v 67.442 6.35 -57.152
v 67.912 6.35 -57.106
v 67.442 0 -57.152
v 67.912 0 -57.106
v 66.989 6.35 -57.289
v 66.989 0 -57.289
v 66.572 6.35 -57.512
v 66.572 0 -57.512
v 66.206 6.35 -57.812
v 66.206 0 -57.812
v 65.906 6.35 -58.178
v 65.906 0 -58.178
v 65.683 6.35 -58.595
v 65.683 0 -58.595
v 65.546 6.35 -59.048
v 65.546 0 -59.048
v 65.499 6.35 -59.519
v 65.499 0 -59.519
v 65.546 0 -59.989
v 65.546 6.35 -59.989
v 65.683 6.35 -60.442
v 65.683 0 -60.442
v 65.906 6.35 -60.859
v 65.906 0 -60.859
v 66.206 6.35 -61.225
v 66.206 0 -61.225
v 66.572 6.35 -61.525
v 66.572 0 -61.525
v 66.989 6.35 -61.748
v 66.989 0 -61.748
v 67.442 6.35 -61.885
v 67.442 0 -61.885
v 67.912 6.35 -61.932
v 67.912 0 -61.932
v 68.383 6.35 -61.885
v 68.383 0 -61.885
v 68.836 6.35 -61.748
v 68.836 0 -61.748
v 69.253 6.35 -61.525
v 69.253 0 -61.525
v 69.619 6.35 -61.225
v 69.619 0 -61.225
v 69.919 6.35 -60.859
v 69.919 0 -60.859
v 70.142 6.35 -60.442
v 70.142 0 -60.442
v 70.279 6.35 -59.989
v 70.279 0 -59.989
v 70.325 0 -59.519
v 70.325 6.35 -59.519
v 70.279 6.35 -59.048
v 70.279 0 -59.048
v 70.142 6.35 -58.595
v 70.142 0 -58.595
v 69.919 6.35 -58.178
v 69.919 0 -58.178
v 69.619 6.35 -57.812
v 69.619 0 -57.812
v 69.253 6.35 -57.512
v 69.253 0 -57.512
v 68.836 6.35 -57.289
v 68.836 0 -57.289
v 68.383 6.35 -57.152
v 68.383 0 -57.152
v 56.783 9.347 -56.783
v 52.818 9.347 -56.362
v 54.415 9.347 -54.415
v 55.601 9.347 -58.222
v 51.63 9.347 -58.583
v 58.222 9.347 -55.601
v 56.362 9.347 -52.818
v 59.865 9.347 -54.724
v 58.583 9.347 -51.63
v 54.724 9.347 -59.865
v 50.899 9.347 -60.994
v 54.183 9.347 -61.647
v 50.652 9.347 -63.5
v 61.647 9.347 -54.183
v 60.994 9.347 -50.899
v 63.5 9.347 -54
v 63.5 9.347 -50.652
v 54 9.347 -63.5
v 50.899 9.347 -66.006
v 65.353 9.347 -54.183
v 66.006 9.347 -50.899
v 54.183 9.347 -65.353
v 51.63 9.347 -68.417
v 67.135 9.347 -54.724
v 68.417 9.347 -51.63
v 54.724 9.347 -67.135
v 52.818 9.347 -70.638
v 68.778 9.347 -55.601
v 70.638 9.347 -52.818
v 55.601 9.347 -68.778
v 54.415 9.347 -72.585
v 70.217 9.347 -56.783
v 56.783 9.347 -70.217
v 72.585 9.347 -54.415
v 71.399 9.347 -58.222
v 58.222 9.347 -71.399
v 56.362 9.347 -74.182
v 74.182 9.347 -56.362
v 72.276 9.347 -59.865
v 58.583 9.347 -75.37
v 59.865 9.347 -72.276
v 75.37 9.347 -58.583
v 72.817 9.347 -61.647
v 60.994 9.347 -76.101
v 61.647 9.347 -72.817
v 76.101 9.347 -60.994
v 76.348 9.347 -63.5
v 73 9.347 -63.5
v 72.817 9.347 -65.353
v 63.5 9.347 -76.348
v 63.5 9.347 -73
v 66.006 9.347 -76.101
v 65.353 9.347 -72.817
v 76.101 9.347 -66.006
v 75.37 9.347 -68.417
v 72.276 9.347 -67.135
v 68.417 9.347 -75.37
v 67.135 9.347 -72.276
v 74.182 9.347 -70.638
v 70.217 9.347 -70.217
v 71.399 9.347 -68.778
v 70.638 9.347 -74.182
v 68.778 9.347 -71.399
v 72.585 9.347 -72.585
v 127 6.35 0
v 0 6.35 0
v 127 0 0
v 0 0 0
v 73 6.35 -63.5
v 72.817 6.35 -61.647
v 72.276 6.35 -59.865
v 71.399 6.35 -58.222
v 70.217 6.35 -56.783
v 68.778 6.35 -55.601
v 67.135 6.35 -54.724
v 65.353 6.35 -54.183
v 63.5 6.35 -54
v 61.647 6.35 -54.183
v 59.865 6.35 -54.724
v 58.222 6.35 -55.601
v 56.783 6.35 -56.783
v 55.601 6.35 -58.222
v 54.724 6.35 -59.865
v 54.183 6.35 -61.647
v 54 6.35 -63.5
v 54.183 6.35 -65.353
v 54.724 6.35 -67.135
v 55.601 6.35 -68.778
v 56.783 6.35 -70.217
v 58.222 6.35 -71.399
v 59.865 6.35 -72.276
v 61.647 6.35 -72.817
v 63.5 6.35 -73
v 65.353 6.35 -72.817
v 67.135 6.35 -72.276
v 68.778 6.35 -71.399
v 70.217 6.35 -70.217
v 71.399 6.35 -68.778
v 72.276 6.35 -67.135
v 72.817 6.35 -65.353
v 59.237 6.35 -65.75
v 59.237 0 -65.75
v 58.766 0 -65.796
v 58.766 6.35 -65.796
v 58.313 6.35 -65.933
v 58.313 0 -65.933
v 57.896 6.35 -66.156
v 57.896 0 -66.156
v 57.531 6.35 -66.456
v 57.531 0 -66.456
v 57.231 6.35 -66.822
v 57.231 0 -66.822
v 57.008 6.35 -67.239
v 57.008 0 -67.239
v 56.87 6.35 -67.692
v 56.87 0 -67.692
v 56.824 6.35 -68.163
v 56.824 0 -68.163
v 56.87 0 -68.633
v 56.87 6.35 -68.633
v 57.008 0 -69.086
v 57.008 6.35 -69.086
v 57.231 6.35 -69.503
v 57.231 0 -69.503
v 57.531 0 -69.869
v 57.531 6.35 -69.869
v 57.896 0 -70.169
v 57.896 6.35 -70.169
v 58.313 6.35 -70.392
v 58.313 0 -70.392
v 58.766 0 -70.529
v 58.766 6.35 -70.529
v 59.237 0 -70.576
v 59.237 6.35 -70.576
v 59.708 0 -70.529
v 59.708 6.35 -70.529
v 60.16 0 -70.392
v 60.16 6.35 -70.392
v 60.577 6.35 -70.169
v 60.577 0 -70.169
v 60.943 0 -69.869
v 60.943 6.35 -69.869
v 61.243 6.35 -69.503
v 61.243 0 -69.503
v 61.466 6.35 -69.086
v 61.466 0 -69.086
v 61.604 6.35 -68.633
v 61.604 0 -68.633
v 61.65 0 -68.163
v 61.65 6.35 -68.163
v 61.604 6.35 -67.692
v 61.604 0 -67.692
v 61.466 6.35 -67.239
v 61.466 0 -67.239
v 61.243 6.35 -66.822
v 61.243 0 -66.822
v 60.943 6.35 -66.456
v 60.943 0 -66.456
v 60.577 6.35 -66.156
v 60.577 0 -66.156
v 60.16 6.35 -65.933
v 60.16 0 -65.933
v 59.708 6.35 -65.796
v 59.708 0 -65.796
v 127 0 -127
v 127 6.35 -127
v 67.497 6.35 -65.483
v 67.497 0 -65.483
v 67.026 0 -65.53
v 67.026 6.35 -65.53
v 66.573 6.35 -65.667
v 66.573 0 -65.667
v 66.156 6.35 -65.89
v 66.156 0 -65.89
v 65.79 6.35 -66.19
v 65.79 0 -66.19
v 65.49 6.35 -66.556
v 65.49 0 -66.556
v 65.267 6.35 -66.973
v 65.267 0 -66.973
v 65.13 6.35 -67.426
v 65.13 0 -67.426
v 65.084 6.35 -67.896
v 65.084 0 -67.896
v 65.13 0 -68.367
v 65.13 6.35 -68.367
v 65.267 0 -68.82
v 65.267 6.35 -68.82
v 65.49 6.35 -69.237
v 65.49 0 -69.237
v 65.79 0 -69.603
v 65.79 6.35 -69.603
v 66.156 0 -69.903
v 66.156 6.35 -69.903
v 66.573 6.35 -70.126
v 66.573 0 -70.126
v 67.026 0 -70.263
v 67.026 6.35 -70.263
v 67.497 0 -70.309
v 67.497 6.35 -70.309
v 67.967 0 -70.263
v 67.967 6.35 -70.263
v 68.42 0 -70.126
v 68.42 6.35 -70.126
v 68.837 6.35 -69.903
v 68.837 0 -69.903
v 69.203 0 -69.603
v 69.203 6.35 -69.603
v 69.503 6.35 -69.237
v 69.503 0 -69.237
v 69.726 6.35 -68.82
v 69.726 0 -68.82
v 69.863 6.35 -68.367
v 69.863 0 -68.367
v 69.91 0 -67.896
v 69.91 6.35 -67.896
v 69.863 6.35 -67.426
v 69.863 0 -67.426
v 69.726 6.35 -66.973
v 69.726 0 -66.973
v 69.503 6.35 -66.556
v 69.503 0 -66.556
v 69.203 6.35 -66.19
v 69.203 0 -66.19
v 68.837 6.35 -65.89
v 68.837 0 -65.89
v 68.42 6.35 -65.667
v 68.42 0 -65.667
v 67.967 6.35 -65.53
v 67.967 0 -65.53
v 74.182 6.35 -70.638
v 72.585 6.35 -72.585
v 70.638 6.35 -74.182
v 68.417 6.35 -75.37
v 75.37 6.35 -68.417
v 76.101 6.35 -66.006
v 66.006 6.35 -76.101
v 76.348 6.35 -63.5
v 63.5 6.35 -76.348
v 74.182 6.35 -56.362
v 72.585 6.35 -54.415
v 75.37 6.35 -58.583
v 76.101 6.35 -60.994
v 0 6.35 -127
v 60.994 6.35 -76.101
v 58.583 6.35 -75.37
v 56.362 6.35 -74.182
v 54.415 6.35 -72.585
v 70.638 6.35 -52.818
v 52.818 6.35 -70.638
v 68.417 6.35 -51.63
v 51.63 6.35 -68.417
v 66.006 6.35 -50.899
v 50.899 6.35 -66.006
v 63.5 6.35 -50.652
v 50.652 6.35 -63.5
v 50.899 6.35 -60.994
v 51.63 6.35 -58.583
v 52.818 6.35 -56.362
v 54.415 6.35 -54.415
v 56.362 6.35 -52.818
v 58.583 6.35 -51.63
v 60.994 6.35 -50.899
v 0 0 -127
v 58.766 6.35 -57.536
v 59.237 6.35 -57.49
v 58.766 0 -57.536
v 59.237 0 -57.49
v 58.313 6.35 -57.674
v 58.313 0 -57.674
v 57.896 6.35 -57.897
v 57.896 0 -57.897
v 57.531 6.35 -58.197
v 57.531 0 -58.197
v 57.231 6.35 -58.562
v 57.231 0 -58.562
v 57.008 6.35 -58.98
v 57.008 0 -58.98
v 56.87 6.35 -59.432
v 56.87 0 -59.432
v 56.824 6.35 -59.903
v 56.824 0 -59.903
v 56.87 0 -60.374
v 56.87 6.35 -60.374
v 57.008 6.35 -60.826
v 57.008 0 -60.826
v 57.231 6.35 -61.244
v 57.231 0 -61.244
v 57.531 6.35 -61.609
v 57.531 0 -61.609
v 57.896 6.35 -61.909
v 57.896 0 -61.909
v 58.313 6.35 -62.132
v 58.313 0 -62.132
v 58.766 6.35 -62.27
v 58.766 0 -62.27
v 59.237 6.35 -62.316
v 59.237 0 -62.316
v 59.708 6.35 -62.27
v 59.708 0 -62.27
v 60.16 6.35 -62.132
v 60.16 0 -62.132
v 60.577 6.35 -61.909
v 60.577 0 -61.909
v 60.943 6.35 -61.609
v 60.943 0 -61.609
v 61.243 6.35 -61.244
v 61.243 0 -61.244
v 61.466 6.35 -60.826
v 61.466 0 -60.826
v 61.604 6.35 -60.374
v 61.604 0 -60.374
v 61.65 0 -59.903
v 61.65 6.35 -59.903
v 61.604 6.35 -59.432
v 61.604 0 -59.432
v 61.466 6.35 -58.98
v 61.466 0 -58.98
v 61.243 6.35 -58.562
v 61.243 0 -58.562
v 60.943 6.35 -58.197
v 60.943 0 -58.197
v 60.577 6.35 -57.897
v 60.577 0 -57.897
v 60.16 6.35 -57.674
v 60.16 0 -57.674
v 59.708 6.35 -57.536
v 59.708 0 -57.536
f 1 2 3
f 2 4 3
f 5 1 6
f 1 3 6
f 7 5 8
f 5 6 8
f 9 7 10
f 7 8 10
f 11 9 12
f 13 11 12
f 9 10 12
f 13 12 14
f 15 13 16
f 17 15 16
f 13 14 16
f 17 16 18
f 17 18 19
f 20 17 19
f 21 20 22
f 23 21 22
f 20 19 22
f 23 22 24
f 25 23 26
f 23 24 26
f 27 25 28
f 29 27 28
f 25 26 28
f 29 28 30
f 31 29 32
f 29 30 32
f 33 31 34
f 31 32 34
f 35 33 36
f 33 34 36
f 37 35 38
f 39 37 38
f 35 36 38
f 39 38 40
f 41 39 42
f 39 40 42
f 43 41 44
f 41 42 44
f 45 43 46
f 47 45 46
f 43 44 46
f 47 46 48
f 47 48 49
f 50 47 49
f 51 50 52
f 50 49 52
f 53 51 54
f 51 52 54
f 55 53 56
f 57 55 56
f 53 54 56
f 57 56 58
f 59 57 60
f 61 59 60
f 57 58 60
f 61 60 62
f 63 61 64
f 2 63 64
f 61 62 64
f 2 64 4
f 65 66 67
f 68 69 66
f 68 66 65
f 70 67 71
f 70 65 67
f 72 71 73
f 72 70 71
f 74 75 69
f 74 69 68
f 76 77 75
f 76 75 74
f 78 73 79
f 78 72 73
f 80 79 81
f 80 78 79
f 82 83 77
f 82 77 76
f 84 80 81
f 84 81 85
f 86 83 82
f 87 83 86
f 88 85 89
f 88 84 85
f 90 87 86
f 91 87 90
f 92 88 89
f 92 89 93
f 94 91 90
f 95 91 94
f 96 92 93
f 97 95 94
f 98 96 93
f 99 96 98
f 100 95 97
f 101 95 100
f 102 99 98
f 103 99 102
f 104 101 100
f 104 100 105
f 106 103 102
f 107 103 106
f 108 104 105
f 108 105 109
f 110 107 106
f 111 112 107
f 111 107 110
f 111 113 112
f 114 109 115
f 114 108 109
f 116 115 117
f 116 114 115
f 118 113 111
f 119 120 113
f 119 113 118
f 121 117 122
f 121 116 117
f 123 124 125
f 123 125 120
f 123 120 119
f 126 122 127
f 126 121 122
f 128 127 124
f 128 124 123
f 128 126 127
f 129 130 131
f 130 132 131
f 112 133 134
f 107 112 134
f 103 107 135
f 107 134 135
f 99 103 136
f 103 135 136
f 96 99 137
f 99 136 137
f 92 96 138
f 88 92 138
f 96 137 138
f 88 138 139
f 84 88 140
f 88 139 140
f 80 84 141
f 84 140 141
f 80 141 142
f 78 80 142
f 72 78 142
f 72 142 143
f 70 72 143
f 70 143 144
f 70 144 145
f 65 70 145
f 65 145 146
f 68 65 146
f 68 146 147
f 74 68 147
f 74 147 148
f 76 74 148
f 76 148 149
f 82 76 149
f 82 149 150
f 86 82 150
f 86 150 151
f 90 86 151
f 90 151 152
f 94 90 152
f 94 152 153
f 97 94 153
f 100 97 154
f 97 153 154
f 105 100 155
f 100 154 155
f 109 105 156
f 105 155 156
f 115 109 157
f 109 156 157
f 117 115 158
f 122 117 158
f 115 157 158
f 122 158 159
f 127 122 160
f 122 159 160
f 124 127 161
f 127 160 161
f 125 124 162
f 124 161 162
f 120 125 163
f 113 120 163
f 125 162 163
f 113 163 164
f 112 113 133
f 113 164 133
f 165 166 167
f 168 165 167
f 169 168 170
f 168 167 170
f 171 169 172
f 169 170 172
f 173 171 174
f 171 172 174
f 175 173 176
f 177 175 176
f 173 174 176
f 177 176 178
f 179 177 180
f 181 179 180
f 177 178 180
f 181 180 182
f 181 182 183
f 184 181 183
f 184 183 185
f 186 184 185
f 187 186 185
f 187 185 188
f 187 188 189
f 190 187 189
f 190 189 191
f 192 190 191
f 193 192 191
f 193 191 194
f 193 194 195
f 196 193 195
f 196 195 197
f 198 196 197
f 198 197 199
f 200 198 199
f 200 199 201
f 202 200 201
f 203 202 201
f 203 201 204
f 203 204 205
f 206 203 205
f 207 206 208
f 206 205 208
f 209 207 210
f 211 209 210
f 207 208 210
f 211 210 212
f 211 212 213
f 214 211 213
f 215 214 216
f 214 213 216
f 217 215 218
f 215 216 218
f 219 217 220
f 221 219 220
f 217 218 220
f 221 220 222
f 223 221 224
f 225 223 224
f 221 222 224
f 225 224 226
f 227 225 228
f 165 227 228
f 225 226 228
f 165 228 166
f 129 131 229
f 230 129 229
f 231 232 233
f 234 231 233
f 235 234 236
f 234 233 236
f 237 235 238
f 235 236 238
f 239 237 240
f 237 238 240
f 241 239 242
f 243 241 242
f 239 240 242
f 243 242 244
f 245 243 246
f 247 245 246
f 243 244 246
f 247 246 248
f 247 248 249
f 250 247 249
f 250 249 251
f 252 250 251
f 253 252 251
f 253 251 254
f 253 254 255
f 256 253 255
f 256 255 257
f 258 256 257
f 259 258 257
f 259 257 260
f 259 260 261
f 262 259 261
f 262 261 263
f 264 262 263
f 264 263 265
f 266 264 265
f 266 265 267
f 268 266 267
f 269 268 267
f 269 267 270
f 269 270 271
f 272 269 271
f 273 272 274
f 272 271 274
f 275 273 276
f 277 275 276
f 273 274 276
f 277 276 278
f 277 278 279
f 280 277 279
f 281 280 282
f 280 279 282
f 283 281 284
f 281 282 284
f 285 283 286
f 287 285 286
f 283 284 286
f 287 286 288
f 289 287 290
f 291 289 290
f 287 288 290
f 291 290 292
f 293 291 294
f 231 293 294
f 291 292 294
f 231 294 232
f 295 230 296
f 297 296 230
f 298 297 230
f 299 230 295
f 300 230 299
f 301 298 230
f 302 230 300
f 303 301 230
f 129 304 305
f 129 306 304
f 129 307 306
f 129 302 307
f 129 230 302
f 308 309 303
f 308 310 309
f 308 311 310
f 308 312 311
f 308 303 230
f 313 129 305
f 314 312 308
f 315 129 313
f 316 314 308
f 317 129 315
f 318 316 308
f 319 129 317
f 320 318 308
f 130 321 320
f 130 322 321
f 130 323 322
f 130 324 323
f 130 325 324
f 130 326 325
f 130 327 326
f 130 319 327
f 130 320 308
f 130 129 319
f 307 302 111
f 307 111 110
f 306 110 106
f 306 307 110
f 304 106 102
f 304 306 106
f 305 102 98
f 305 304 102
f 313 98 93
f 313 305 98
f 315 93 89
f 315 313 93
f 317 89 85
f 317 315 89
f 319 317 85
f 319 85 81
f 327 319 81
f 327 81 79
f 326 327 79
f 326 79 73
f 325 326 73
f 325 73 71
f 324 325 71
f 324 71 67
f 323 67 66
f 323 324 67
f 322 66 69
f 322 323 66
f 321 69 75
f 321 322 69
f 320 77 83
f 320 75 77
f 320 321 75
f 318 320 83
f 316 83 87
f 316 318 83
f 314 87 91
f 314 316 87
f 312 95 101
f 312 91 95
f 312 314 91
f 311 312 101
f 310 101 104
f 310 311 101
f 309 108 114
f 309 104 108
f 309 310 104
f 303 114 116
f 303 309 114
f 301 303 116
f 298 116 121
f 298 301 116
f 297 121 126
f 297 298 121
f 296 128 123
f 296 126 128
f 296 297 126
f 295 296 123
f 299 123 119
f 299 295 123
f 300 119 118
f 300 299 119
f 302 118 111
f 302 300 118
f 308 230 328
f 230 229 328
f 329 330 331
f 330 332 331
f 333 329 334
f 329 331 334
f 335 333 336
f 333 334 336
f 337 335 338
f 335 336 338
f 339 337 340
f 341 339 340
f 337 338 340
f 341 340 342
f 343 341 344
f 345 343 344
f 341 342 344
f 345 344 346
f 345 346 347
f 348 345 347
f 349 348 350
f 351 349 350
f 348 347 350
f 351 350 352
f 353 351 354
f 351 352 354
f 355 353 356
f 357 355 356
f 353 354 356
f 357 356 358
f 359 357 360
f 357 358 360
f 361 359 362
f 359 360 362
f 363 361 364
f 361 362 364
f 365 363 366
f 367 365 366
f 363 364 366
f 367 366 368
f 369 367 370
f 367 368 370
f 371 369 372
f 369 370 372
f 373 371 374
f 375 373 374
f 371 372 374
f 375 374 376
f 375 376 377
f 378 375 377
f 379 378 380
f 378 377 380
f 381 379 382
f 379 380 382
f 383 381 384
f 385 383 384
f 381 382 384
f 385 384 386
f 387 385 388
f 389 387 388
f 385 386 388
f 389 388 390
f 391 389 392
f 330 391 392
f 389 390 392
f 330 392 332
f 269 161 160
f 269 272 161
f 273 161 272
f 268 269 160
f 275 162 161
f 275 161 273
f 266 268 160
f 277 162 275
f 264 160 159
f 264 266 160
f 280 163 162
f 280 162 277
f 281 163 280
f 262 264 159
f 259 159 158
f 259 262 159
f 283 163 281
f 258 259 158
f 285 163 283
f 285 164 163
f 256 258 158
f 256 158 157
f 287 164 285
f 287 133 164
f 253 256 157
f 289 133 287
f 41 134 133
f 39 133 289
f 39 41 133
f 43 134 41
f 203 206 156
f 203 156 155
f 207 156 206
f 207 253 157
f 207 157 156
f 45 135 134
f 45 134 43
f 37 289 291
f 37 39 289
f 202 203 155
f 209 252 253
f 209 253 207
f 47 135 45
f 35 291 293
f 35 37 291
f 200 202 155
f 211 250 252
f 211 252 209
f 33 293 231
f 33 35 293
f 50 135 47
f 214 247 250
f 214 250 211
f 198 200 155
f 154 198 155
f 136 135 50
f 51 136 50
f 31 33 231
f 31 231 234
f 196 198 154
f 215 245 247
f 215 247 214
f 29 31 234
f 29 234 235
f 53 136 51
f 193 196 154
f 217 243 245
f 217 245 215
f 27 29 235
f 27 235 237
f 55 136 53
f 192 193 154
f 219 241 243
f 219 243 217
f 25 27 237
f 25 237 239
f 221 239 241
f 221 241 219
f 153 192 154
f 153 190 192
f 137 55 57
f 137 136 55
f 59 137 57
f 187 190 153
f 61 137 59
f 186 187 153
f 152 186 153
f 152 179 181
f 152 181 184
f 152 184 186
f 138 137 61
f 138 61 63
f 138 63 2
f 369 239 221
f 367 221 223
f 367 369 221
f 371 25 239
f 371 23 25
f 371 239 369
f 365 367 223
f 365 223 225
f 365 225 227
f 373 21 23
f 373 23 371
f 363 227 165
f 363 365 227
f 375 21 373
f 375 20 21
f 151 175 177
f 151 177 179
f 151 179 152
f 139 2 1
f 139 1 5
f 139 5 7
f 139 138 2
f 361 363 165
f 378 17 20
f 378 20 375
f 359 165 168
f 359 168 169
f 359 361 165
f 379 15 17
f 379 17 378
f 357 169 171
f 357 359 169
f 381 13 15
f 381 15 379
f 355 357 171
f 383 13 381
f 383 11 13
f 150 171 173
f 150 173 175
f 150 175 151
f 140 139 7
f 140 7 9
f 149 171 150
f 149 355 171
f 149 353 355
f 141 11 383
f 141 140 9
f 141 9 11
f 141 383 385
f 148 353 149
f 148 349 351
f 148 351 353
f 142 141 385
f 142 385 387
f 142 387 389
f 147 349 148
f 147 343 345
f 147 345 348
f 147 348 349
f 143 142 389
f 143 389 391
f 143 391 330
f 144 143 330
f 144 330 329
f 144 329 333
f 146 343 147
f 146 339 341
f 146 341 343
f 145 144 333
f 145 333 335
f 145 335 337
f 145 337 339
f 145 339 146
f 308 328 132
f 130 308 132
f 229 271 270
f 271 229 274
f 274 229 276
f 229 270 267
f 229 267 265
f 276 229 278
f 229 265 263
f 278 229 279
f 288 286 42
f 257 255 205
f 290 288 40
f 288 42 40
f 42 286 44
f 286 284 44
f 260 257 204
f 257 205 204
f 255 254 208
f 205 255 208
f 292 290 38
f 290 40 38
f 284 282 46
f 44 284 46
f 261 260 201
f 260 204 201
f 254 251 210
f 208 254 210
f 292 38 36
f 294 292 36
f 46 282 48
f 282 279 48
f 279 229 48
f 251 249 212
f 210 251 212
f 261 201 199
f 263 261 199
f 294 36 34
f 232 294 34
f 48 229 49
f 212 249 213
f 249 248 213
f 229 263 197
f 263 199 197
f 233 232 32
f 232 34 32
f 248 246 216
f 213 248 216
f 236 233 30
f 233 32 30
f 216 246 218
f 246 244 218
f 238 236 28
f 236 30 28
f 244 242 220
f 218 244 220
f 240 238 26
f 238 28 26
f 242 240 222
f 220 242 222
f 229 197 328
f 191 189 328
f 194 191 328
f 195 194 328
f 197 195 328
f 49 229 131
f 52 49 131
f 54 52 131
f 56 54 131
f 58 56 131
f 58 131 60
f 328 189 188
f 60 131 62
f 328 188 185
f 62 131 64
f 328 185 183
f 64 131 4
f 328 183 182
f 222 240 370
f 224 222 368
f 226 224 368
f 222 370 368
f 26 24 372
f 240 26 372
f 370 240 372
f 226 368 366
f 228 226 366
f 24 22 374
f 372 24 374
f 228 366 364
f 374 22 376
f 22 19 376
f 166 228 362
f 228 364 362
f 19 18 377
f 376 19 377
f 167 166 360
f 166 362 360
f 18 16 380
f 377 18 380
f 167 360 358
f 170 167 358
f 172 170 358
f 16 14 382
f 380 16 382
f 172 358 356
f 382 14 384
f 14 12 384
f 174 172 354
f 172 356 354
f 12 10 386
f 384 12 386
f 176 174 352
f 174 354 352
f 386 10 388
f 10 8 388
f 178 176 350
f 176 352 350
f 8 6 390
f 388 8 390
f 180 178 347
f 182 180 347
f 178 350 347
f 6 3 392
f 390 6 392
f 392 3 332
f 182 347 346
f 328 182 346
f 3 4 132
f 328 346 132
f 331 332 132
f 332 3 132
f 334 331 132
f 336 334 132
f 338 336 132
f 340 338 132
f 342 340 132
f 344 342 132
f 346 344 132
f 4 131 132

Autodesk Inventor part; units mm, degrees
ref_plane "YZ Plane" through (0, 0, 0) normal (1, 0, 0) x (0, 1, 0)
ref_plane "XZ Plane" through (0, 0, 0) normal (0, 1, 0) x (-1, 0, 0)
ref_plane "XY Plane" through (0, 0, 0) normal (0, 0, 1) x (1, 0, 0)
sketch "Sketch1" plane through (0, 0, 0) normal (0, 1, 0) x (-1, 0, 0)
  line L0 (0, 0) -> (-127, 0)
  line L1 (-127, 0) -> (-127, -127)
  line L2 (-127, -127) -> (0, -127)
  line L3 (0, -127) -> (0, 0)
  dimension "d0" = 127
  dimension "d1" = 127
extrude "Extrusion1" add sketch "Sketch1" along normal blind 6.35
sketch "Sketch2" plane through (0, 6.35, 0) normal (0, 1, 0) x (1, 0, 0)
  line L0 (0, 0) -> (127, 0) projected
  line L1 (127, 0) -> (127, 127) projected
  line L2 (56.7828, 56.7828) -> (70.2172, 70.2172)
  line L3 (127, 127) -> (127, 0)
  line L4 (70.2172, 56.7828) -> (56.7828, 70.2172)
  line L5 (0, 127) -> (0, 0) projected
  circle A0 centre (63.5, 63.5) radius 9.4996
  circle A1 centre (63.5, 63.5) radius 12.8477
extrude "Extrusion2" add sketch "Sketch2" along normal blind 2.9972
sketch "Sketch3" plane through (63.5, 6.35, -63.5) normal (0, 1, 0) x (1, 0, 0)
  circle A0 centre (0, 0) radius 9.4996 projected
  line L0 (9.4891, 0.446) -> (9.7729, 0.446) construction
  line L1 (-5.8104, 5.9947) -> (-6.6345, 6.7989)
  circle A1 centre (3.7745, 4.4415) radius 2.413
  circle A2 centre (4.4123, -3.9814) radius 2.413
  circle A3 centre (-4.3831, -3.9179) radius 2.413
  circle A4 centre (-4.0835, 4.3094) radius 2.413
  line L2 (6.1393, -5.6667) -> (6.9589, -6.4665)
  line L3 (5.4598, 6.1684) -> (6.3421, 7.0725)
  line L4 (-6.9155, -6.5129) -> (-6.0684, -5.6448)
  line L5 (6.9589, -6.4665) -> (6.1393, -5.6667)
  point P0 (-63.5, -63.5)
hole "Hole1" at (67.4966, 6.35, -67.8963) direction (0, -1, 0) diameter 4.826 end through all
hole "Hole2" at (59.2369, 6.35, -68.1627) direction (0, -1, 0) diameter 4.826 end through all
hole "Hole3" at (59.2369, 6.35, -59.903) direction (0, -1, 0) diameter 4.826 end through all
hole "Hole4" at (67.9123, 6.35, -59.5186) direction (0, -1, 0) diameter 4.826 end through all
